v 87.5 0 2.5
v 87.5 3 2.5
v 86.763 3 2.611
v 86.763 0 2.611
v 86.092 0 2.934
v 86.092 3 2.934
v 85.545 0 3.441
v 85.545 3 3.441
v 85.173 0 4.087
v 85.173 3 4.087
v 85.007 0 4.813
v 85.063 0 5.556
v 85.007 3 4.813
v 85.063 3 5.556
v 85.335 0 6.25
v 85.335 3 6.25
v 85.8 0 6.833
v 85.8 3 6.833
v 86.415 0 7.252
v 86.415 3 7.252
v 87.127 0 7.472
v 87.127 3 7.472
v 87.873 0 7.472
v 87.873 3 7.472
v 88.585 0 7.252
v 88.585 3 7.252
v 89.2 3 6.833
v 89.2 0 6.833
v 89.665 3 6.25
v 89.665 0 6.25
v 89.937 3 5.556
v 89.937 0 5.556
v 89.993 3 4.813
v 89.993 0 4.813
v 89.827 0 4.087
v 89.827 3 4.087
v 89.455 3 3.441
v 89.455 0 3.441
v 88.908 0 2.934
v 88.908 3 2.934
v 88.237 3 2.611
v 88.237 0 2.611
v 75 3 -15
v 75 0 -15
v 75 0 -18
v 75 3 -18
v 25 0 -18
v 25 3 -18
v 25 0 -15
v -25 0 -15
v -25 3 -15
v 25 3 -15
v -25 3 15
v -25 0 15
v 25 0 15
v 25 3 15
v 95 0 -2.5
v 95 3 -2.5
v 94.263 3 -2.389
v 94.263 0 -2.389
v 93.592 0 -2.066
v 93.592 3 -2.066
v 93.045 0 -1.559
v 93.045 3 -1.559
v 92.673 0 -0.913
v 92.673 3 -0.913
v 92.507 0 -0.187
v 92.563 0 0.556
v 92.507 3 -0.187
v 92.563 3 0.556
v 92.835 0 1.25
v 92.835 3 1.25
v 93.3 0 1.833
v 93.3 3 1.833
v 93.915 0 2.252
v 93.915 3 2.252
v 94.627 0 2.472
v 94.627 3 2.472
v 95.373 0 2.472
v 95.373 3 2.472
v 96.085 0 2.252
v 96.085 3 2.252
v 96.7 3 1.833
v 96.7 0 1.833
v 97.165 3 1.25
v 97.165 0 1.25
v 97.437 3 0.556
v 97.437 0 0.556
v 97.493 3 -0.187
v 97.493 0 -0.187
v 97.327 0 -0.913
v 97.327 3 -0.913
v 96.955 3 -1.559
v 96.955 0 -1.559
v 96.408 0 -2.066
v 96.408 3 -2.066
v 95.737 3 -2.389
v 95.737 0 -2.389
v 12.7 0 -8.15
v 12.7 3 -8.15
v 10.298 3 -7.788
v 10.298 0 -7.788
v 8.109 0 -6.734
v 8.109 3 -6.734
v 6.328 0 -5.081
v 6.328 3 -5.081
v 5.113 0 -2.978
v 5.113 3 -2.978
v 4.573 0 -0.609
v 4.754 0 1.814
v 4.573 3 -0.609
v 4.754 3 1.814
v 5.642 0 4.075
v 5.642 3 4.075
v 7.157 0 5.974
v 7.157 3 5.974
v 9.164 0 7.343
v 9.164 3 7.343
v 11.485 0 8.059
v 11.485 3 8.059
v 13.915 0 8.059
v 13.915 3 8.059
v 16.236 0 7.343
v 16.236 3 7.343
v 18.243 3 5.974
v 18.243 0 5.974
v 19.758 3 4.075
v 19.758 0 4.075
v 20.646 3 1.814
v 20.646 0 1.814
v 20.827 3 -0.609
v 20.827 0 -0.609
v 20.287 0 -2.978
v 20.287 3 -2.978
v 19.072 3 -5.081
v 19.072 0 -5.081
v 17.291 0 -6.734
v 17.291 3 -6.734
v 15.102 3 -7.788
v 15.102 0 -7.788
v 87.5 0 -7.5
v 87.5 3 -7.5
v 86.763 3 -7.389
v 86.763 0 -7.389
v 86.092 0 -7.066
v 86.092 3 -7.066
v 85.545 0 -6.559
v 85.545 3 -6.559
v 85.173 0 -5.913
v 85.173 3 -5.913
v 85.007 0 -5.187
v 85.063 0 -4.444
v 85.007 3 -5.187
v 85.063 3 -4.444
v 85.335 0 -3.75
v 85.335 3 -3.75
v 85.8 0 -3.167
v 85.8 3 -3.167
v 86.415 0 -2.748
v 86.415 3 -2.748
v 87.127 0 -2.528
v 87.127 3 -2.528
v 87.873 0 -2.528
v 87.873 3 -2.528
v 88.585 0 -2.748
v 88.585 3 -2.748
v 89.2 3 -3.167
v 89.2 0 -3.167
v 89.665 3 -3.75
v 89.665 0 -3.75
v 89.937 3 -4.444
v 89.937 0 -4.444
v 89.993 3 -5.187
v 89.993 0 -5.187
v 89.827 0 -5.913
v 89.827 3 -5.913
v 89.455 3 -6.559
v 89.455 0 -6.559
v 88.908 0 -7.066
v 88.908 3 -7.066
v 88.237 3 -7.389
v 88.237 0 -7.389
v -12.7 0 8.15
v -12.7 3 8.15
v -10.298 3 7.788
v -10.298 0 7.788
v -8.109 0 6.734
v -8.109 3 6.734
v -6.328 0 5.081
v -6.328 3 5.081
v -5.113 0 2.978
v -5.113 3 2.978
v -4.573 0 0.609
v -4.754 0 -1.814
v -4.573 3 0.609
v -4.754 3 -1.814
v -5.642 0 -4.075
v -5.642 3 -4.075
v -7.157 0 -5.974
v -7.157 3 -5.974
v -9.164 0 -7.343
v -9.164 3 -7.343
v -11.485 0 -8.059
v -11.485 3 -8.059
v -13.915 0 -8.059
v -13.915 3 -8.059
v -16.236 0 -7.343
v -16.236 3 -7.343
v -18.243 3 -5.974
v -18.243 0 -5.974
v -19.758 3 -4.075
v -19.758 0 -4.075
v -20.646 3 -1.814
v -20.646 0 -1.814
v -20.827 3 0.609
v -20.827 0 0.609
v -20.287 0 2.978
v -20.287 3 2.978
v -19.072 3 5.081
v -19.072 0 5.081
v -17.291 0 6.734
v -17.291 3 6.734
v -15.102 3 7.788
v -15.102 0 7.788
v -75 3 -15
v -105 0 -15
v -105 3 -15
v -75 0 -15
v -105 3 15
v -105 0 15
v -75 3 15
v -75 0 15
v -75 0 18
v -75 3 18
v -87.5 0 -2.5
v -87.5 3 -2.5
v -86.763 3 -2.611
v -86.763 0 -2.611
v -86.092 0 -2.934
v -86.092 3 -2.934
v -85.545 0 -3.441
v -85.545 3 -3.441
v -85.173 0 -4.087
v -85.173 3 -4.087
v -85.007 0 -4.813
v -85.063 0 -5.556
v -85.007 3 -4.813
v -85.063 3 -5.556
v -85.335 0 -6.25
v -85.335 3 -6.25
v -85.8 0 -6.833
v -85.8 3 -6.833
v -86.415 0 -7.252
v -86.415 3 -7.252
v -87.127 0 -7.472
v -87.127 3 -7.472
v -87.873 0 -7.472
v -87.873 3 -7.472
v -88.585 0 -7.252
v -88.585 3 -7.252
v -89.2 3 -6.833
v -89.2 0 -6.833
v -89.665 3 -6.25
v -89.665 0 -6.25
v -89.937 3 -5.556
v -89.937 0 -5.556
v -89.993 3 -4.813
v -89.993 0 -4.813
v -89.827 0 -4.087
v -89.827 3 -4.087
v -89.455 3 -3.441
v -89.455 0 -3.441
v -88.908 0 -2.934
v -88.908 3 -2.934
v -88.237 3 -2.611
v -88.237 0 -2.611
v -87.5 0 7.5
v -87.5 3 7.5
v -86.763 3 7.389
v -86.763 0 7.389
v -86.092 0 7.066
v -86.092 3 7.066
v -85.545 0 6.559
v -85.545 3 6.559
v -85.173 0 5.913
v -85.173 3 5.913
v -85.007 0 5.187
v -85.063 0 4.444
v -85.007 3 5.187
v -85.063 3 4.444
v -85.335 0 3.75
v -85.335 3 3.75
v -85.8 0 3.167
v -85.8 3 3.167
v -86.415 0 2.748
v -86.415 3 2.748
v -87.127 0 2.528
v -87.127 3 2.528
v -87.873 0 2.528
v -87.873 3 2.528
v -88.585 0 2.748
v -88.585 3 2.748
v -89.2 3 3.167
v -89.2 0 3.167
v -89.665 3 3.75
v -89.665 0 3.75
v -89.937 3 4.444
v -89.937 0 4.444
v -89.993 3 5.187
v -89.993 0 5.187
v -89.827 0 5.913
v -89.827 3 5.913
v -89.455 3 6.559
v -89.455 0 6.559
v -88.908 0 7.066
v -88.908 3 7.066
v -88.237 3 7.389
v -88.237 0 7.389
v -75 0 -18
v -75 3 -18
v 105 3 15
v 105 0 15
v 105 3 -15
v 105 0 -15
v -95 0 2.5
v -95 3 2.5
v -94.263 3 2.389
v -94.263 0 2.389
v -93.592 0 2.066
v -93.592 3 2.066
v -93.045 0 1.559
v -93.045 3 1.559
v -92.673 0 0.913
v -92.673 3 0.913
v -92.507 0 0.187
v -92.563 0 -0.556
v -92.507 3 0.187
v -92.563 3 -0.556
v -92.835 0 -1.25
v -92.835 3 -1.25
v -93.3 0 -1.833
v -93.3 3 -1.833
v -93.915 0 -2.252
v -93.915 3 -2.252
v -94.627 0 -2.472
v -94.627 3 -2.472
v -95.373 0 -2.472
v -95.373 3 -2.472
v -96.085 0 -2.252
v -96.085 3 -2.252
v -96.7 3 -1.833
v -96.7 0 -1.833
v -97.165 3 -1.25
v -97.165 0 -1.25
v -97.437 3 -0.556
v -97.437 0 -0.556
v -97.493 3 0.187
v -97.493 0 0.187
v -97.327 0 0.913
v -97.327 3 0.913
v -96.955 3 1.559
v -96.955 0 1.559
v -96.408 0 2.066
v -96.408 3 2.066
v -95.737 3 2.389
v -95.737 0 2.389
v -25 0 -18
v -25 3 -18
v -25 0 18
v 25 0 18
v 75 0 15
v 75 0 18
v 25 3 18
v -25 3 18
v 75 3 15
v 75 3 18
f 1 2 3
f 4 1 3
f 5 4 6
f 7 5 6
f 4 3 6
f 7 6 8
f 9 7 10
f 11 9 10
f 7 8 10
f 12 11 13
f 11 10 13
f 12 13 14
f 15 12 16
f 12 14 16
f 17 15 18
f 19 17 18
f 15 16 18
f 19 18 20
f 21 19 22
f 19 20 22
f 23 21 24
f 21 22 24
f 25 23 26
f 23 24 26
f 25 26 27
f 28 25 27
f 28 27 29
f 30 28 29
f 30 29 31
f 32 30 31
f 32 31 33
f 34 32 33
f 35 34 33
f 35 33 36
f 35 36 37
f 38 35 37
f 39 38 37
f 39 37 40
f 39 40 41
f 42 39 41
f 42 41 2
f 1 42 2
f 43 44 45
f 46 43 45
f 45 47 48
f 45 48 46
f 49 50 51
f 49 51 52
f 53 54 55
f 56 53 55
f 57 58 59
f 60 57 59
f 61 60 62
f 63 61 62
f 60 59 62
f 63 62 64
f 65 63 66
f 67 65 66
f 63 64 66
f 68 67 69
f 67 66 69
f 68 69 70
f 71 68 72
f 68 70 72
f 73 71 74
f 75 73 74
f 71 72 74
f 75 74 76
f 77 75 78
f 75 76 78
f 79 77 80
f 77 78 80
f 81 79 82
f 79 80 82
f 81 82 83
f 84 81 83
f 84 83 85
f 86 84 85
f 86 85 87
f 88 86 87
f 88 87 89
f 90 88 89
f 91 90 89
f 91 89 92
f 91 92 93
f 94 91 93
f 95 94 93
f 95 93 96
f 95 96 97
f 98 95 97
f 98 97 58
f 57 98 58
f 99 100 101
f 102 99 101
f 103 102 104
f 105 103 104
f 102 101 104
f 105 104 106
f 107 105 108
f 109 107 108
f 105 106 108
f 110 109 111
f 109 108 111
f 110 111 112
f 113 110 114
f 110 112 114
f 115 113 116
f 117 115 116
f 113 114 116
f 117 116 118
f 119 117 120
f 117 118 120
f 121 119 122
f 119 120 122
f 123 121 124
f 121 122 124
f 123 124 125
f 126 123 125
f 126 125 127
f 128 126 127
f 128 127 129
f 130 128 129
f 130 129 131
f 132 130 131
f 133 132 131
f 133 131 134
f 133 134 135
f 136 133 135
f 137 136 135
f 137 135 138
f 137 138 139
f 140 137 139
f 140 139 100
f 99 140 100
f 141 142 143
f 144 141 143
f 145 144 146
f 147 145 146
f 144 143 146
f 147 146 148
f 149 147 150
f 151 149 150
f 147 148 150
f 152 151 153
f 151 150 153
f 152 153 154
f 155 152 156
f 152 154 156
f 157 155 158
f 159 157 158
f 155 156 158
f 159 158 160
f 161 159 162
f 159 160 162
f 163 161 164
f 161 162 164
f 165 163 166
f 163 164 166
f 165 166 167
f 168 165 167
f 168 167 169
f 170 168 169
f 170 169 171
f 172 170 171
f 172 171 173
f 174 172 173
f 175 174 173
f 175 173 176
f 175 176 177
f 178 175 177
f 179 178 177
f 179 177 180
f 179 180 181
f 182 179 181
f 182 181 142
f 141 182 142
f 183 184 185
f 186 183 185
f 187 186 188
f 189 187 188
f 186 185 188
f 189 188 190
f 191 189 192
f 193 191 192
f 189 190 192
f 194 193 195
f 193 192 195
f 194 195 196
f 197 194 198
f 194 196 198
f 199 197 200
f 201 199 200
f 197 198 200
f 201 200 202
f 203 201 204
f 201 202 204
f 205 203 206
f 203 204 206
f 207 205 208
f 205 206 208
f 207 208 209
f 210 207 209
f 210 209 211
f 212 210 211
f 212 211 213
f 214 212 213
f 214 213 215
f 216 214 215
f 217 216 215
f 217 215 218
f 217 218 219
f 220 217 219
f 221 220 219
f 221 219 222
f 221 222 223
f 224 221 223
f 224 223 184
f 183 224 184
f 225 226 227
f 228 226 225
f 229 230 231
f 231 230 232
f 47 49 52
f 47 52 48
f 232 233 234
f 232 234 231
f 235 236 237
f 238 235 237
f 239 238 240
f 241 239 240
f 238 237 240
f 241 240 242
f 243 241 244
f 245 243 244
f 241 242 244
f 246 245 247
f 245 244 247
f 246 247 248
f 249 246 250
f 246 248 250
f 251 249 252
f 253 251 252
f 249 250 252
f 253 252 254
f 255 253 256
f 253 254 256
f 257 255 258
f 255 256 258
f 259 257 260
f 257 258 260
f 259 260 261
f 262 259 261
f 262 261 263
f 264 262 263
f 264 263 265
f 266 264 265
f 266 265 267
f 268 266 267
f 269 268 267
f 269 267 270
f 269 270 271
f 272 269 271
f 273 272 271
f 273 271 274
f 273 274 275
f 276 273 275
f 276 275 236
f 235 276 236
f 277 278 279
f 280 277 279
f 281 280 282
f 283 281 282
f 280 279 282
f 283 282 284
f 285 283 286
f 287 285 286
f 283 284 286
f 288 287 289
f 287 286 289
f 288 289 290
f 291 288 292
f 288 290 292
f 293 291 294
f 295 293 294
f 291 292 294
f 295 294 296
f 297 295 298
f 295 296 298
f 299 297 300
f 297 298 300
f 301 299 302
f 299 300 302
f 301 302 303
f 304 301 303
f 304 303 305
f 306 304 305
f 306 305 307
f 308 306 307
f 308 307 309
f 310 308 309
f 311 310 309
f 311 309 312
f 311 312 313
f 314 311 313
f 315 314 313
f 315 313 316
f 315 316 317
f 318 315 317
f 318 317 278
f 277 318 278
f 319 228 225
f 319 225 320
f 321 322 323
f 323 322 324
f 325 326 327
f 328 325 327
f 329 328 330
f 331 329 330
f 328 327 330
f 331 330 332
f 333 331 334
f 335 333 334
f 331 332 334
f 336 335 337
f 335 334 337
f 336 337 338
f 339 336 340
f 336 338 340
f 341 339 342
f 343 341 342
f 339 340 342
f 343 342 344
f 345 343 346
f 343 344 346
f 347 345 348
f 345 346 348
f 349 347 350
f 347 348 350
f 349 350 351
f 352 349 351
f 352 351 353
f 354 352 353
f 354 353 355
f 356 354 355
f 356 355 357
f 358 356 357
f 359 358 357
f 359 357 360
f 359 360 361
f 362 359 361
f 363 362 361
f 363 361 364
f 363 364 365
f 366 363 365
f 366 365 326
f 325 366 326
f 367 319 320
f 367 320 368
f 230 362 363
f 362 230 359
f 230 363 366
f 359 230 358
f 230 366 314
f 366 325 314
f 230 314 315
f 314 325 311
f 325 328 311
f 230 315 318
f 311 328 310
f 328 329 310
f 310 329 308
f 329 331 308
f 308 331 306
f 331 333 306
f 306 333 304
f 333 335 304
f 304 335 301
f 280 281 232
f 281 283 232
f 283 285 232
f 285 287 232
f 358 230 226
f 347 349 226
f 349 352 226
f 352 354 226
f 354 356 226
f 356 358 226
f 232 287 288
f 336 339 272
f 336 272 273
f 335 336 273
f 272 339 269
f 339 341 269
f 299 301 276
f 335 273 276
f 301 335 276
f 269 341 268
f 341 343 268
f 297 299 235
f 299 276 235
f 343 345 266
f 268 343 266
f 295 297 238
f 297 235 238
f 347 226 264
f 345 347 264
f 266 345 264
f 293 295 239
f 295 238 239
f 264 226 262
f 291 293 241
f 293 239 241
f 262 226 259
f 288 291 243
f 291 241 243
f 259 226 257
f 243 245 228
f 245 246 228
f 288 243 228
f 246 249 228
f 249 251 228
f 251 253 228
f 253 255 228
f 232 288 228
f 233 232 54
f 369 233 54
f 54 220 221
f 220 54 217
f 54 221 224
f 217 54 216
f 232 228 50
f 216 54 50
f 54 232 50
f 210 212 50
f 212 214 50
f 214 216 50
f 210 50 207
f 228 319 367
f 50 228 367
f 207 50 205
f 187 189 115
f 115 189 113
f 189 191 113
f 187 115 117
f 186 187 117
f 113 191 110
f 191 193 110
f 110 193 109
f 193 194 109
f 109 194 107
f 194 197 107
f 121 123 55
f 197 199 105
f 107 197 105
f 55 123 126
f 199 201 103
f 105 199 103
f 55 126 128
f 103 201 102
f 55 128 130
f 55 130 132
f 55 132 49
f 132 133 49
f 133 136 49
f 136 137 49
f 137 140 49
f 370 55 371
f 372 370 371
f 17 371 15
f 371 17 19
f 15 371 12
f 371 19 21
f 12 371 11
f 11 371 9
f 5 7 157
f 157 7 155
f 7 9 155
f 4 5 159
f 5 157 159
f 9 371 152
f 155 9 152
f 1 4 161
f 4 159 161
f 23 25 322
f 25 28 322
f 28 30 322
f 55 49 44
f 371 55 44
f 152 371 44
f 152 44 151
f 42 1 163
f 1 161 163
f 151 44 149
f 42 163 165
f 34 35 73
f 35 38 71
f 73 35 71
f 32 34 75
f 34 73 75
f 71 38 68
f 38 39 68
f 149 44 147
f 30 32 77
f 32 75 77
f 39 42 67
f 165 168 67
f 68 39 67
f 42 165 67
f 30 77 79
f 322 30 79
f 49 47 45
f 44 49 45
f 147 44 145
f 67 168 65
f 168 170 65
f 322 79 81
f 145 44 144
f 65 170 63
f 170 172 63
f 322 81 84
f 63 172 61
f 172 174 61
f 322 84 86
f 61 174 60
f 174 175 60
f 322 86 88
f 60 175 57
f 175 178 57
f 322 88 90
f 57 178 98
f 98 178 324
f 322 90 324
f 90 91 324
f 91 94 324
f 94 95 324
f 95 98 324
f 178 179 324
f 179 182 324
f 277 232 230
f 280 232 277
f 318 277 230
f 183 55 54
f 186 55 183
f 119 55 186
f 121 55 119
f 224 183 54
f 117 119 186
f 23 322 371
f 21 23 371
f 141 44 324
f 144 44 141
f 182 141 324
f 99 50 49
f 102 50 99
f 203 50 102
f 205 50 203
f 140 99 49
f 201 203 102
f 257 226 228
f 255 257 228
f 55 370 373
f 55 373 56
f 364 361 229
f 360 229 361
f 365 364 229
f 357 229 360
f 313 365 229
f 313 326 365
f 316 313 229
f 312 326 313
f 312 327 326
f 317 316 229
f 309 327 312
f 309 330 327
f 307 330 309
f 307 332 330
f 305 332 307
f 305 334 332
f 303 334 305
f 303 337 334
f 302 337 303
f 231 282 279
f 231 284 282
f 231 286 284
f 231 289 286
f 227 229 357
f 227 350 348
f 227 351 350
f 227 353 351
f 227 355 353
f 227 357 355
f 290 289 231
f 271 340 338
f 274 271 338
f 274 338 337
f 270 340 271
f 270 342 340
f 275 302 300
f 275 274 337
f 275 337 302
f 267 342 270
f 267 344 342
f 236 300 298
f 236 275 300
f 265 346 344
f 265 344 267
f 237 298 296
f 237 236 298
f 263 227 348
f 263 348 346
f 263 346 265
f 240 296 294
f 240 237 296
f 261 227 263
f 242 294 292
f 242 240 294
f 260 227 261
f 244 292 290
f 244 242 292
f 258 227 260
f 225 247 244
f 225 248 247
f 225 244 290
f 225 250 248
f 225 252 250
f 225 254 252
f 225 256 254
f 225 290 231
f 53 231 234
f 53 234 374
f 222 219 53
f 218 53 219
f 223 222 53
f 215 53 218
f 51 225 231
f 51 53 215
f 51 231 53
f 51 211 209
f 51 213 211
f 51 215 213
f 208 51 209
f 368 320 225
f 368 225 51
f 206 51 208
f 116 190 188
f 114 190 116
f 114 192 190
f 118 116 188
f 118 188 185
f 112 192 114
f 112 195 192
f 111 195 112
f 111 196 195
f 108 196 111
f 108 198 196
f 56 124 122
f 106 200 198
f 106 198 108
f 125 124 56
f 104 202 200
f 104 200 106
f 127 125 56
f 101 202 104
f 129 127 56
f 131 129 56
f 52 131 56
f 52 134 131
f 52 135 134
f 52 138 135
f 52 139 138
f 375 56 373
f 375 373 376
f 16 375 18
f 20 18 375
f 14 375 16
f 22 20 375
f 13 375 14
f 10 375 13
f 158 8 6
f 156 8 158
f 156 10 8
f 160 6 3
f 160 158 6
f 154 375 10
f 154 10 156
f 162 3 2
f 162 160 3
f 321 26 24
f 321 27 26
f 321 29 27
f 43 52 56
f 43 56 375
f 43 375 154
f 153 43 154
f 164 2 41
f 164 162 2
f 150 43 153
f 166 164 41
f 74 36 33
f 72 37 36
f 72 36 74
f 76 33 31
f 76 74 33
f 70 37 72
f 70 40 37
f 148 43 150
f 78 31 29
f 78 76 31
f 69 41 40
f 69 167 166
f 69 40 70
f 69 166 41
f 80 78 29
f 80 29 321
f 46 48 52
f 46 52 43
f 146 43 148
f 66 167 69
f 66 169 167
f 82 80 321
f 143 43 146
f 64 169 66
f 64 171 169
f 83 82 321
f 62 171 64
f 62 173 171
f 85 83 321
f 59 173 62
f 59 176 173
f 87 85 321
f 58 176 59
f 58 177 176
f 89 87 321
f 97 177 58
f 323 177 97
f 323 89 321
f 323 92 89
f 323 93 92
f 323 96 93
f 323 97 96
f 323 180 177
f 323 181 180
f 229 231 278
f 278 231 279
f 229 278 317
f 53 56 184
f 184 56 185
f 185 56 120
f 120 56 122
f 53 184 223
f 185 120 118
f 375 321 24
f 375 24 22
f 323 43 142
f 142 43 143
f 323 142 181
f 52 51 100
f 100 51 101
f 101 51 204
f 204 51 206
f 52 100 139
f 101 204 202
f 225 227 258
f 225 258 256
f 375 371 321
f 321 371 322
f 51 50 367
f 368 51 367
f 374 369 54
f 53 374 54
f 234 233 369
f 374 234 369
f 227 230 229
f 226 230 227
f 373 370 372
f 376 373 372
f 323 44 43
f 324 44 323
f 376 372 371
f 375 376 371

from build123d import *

# Parameters (mm, degrees)
SKETCH1_W           = 210
SKETCH1_H           = 30
BOSS_EXTRUDE1_DEPTH = 3
SKETCH2_W           = 50
SKETCH2_H           = 3
BOSS_EXTRUDE2_DEPTH = 3
SKETCH3_R           = 8.15
CUT_EXTRUDE1_DEPTH  = 10
SKETCH4_R           = 2.5
CUT_EXTRUDE2_DEPTH  = 10


with BuildPart() as part:
    # Sketch1 → Boss-Extrude1 (new body)
    with BuildSketch(Plane(origin=(0, 0, 0), x_dir=(1, 0, 0), z_dir=(0, 1, 0))):
        Rectangle(SKETCH1_W, SKETCH1_H)
    extrude(amount=BOSS_EXTRUDE1_DEPTH)

    # Sketch2 → Boss-Extrude2 (add)
    with BuildSketch(Plane(origin=(0, 0, 0), x_dir=(1, 0, 0), z_dir=(0, 1, 0))):
        with Locations((-50, 16.5)):
            Rectangle(SKETCH2_W, SKETCH2_H)
        with Locations((50, 16.5)):
            Rectangle(SKETCH2_W, SKETCH2_H)
        with Locations((50, -16.5)):
            Rectangle(SKETCH2_W, SKETCH2_H)
        with Locations((-50, -16.5)):
            Rectangle(SKETCH2_W, SKETCH2_H)
    extrude(amount=BOSS_EXTRUDE2_DEPTH)

    # Sketch3 → Cut-Extrude1 (cut)
    with BuildSketch(Plane(origin=(0, 3, 0), x_dir=(1, 0, 0), z_dir=(0, 1, 0))):
        with Locations(Location((-12.7, 0, 0), (0, 0, 270))):
            Circle(SKETCH3_R)
        with Locations(Location((12.7, 0, 0), (0, 0, 90))):
            Circle(SKETCH3_R)
    extrude(amount=-CUT_EXTRUDE1_DEPTH, mode=Mode.SUBTRACT)

    # Sketch4 → Cut-Extrude2 (cut)
    with BuildSketch(Plane(origin=(0, 3, 0), x_dir=(1, 0, 0), z_dir=(0, 1, 0))):
        with Locations(Location((-95, 0, 0), (0, 0, 270))):
            Circle(SKETCH4_R)
        with Locations(Location((-87.5, 5, 0), (0, 0, 270))):
            Circle(SKETCH4_R)
        with Locations(Location((-87.5, -5, 0), (0, 0, 270))):
            Circle(SKETCH4_R)
        with Locations(Location((87.5, -5, 0), (0, 0, 90))):
            Circle(SKETCH4_R)
        with Locations(Location((87.5, 5, 0), (0, 0, 90))):
            Circle(SKETCH4_R)
        with Locations(Location((95, 0, 0), (0, 0, 90))):
            Circle(SKETCH4_R)
    extrude(amount=-CUT_EXTRUDE2_DEPTH, mode=Mode.SUBTRACT)


solid = part.part
